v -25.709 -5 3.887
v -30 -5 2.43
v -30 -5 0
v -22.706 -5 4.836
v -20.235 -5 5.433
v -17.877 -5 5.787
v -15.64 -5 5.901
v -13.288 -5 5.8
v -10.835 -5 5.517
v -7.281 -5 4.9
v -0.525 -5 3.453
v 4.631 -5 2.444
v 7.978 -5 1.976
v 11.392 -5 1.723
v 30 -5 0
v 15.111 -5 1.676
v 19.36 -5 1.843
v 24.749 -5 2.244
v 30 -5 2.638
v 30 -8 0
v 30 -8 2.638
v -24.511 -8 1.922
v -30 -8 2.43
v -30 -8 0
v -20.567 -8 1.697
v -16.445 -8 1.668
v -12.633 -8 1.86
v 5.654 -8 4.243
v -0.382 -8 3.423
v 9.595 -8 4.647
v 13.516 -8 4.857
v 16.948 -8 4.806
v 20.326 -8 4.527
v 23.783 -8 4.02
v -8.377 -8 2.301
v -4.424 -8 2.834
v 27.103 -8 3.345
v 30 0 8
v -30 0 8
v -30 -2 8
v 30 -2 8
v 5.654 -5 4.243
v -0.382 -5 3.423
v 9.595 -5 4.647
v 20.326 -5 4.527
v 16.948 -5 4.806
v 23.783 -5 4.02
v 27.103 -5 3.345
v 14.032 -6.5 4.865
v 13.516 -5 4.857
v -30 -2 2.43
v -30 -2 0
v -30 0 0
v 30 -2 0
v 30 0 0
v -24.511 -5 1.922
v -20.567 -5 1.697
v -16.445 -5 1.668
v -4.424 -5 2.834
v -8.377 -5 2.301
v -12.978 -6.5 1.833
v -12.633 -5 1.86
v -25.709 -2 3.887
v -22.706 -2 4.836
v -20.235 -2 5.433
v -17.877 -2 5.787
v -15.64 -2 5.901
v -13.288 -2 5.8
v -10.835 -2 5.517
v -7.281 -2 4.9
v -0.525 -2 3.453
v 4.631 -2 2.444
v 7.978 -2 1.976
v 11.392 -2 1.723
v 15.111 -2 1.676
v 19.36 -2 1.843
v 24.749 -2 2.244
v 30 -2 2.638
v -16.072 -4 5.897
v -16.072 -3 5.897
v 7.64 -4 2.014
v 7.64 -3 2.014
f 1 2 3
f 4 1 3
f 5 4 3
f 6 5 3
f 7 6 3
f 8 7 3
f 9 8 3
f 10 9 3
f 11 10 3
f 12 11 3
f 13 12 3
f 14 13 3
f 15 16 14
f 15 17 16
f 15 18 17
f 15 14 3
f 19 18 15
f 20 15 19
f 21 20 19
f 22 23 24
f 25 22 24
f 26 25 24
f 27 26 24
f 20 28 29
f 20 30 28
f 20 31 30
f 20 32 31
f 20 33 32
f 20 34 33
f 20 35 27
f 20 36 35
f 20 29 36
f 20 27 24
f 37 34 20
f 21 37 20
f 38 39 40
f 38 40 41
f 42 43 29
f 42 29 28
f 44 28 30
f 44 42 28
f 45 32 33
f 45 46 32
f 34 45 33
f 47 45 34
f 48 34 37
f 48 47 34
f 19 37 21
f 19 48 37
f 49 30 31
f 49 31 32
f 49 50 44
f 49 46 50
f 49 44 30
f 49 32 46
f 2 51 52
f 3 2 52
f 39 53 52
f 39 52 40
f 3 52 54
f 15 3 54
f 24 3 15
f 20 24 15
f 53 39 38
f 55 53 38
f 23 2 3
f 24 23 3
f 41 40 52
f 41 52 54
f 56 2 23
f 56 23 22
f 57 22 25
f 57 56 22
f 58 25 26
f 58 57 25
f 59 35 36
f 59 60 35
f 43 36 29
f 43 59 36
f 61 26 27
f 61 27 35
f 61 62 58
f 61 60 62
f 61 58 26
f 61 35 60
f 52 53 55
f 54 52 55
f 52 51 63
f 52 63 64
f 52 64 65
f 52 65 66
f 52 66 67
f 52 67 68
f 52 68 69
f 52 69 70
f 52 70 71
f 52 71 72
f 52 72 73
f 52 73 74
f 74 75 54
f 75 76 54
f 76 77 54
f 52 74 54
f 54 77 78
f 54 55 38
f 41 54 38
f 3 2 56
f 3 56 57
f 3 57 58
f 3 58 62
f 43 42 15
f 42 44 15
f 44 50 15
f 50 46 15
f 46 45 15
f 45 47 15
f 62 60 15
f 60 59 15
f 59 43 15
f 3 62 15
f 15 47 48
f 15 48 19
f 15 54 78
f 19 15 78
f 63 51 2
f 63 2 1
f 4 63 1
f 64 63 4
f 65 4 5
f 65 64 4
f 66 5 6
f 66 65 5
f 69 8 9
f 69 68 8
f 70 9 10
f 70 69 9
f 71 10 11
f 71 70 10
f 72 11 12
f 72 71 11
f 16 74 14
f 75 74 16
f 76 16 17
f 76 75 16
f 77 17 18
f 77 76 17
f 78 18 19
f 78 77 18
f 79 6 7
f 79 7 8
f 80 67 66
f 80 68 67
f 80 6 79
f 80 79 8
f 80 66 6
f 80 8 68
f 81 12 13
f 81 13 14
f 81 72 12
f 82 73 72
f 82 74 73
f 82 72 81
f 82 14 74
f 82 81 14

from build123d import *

# Parameters (mm, degrees)
F0_W     = 60
F0_H     = 8
F1_DEPTH = 2
F3_DEPTH = 3
F5_DEPTH = 3


with BuildPart() as f1:
    # F0 (on Front) → F1 (new body)
    with BuildSketch(Plane.XZ):
        with Locations((0, 4)):
            Rectangle(F0_W, F0_H)
    extrude(amount=F1_DEPTH)


with BuildPart() as f3:
    # F2 (on face) → F3 (new body)
    with BuildSketch(Plane.XZ.offset(2)):
        with BuildLine():
            Line((30, 0), (30, 2.6379409246))
            add(Edge.make_bspline(
                [(-30, 2.4299453944), (-25.7753089442, 3.7473113683), (-15.8059440997, 8.4259376352), (7.8064424043, -0.0315454429), (22.9400642828, 2.2146652387), (30, 2.6379409246)],
                knots=[0, 0, 0, 0, 0.2823099555, 0.6475705955, 1, 1, 1, 1], degree=3))
            Line((-30, 2.4299453944), (-30, 0))
            Line((-30, 0), (30, 0))
        make_face()
    extrude(amount=F3_DEPTH)


with BuildPart() as f5:
    # F4 (on face) → F5 (new body)
    with BuildSketch(Plane.XZ.offset(5)):
        with BuildLine():
            Line((30, 0), (30, 2.6379409246))
            add(Edge.make_bspline(
                [(-0.3818561897, 3.4225663377), (2.2921859732, 2.848791241), (13.0066260243, 0.7402927917), (22.9400642828, 2.2146652387), (30, 2.6379409246)],
                knots=[0.5289211134, 0.5289211134, 0.5289211134, 0.5289211134, 0.6475705955, 1, 1, 1, 1], degree=3))
            add(Edge.make_bspline(
                [(-30, 2.4299453944), (-25.0229177526, 1.9377897531), (-16.3615874818, 0.9969518948), (-4.7420355501, 2.7876398307), (-0.3818561897, 3.4225663377)],
                knots=[0, 0, 0, 0, 0.3090053833, 0.4920755652, 0.4920755652, 0.4920755652, 0.4920755652], degree=3))
            Line((-30, 2.4299453944), (-30, 0))
            Line((-30, 0), (30, 0))
        make_face()
        with BuildLine():
            add(Edge.make_bspline(
                [(-0.3818561897, 3.4225663377), (2.2921859732, 2.848791241), (13.0066260243, 0.7402927917), (22.9400642828, 2.2146652387), (30, 2.6379409246)],
                knots=[0.5289211134, 0.5289211134, 0.5289211134, 0.5289211134, 0.6475705955, 1, 1, 1, 1], degree=3))
            add(Edge.make_bspline(
                [(-0.3818561897, 3.4225663377), (4.5549169776, 4.1414560631), (16.7692529019, 5.8047993769), (26.0268184921, 3.6596331068), (30, 2.6379409246)],
                knots=[0.4920755652, 0.4920755652, 0.4920755652, 0.4920755652, 0.6993551029, 1, 1, 1, 1], degree=3))
        make_face()
    extrude(amount=F5_DEPTH)


solid = Compound([f1.part, f3.part, f5.part])
